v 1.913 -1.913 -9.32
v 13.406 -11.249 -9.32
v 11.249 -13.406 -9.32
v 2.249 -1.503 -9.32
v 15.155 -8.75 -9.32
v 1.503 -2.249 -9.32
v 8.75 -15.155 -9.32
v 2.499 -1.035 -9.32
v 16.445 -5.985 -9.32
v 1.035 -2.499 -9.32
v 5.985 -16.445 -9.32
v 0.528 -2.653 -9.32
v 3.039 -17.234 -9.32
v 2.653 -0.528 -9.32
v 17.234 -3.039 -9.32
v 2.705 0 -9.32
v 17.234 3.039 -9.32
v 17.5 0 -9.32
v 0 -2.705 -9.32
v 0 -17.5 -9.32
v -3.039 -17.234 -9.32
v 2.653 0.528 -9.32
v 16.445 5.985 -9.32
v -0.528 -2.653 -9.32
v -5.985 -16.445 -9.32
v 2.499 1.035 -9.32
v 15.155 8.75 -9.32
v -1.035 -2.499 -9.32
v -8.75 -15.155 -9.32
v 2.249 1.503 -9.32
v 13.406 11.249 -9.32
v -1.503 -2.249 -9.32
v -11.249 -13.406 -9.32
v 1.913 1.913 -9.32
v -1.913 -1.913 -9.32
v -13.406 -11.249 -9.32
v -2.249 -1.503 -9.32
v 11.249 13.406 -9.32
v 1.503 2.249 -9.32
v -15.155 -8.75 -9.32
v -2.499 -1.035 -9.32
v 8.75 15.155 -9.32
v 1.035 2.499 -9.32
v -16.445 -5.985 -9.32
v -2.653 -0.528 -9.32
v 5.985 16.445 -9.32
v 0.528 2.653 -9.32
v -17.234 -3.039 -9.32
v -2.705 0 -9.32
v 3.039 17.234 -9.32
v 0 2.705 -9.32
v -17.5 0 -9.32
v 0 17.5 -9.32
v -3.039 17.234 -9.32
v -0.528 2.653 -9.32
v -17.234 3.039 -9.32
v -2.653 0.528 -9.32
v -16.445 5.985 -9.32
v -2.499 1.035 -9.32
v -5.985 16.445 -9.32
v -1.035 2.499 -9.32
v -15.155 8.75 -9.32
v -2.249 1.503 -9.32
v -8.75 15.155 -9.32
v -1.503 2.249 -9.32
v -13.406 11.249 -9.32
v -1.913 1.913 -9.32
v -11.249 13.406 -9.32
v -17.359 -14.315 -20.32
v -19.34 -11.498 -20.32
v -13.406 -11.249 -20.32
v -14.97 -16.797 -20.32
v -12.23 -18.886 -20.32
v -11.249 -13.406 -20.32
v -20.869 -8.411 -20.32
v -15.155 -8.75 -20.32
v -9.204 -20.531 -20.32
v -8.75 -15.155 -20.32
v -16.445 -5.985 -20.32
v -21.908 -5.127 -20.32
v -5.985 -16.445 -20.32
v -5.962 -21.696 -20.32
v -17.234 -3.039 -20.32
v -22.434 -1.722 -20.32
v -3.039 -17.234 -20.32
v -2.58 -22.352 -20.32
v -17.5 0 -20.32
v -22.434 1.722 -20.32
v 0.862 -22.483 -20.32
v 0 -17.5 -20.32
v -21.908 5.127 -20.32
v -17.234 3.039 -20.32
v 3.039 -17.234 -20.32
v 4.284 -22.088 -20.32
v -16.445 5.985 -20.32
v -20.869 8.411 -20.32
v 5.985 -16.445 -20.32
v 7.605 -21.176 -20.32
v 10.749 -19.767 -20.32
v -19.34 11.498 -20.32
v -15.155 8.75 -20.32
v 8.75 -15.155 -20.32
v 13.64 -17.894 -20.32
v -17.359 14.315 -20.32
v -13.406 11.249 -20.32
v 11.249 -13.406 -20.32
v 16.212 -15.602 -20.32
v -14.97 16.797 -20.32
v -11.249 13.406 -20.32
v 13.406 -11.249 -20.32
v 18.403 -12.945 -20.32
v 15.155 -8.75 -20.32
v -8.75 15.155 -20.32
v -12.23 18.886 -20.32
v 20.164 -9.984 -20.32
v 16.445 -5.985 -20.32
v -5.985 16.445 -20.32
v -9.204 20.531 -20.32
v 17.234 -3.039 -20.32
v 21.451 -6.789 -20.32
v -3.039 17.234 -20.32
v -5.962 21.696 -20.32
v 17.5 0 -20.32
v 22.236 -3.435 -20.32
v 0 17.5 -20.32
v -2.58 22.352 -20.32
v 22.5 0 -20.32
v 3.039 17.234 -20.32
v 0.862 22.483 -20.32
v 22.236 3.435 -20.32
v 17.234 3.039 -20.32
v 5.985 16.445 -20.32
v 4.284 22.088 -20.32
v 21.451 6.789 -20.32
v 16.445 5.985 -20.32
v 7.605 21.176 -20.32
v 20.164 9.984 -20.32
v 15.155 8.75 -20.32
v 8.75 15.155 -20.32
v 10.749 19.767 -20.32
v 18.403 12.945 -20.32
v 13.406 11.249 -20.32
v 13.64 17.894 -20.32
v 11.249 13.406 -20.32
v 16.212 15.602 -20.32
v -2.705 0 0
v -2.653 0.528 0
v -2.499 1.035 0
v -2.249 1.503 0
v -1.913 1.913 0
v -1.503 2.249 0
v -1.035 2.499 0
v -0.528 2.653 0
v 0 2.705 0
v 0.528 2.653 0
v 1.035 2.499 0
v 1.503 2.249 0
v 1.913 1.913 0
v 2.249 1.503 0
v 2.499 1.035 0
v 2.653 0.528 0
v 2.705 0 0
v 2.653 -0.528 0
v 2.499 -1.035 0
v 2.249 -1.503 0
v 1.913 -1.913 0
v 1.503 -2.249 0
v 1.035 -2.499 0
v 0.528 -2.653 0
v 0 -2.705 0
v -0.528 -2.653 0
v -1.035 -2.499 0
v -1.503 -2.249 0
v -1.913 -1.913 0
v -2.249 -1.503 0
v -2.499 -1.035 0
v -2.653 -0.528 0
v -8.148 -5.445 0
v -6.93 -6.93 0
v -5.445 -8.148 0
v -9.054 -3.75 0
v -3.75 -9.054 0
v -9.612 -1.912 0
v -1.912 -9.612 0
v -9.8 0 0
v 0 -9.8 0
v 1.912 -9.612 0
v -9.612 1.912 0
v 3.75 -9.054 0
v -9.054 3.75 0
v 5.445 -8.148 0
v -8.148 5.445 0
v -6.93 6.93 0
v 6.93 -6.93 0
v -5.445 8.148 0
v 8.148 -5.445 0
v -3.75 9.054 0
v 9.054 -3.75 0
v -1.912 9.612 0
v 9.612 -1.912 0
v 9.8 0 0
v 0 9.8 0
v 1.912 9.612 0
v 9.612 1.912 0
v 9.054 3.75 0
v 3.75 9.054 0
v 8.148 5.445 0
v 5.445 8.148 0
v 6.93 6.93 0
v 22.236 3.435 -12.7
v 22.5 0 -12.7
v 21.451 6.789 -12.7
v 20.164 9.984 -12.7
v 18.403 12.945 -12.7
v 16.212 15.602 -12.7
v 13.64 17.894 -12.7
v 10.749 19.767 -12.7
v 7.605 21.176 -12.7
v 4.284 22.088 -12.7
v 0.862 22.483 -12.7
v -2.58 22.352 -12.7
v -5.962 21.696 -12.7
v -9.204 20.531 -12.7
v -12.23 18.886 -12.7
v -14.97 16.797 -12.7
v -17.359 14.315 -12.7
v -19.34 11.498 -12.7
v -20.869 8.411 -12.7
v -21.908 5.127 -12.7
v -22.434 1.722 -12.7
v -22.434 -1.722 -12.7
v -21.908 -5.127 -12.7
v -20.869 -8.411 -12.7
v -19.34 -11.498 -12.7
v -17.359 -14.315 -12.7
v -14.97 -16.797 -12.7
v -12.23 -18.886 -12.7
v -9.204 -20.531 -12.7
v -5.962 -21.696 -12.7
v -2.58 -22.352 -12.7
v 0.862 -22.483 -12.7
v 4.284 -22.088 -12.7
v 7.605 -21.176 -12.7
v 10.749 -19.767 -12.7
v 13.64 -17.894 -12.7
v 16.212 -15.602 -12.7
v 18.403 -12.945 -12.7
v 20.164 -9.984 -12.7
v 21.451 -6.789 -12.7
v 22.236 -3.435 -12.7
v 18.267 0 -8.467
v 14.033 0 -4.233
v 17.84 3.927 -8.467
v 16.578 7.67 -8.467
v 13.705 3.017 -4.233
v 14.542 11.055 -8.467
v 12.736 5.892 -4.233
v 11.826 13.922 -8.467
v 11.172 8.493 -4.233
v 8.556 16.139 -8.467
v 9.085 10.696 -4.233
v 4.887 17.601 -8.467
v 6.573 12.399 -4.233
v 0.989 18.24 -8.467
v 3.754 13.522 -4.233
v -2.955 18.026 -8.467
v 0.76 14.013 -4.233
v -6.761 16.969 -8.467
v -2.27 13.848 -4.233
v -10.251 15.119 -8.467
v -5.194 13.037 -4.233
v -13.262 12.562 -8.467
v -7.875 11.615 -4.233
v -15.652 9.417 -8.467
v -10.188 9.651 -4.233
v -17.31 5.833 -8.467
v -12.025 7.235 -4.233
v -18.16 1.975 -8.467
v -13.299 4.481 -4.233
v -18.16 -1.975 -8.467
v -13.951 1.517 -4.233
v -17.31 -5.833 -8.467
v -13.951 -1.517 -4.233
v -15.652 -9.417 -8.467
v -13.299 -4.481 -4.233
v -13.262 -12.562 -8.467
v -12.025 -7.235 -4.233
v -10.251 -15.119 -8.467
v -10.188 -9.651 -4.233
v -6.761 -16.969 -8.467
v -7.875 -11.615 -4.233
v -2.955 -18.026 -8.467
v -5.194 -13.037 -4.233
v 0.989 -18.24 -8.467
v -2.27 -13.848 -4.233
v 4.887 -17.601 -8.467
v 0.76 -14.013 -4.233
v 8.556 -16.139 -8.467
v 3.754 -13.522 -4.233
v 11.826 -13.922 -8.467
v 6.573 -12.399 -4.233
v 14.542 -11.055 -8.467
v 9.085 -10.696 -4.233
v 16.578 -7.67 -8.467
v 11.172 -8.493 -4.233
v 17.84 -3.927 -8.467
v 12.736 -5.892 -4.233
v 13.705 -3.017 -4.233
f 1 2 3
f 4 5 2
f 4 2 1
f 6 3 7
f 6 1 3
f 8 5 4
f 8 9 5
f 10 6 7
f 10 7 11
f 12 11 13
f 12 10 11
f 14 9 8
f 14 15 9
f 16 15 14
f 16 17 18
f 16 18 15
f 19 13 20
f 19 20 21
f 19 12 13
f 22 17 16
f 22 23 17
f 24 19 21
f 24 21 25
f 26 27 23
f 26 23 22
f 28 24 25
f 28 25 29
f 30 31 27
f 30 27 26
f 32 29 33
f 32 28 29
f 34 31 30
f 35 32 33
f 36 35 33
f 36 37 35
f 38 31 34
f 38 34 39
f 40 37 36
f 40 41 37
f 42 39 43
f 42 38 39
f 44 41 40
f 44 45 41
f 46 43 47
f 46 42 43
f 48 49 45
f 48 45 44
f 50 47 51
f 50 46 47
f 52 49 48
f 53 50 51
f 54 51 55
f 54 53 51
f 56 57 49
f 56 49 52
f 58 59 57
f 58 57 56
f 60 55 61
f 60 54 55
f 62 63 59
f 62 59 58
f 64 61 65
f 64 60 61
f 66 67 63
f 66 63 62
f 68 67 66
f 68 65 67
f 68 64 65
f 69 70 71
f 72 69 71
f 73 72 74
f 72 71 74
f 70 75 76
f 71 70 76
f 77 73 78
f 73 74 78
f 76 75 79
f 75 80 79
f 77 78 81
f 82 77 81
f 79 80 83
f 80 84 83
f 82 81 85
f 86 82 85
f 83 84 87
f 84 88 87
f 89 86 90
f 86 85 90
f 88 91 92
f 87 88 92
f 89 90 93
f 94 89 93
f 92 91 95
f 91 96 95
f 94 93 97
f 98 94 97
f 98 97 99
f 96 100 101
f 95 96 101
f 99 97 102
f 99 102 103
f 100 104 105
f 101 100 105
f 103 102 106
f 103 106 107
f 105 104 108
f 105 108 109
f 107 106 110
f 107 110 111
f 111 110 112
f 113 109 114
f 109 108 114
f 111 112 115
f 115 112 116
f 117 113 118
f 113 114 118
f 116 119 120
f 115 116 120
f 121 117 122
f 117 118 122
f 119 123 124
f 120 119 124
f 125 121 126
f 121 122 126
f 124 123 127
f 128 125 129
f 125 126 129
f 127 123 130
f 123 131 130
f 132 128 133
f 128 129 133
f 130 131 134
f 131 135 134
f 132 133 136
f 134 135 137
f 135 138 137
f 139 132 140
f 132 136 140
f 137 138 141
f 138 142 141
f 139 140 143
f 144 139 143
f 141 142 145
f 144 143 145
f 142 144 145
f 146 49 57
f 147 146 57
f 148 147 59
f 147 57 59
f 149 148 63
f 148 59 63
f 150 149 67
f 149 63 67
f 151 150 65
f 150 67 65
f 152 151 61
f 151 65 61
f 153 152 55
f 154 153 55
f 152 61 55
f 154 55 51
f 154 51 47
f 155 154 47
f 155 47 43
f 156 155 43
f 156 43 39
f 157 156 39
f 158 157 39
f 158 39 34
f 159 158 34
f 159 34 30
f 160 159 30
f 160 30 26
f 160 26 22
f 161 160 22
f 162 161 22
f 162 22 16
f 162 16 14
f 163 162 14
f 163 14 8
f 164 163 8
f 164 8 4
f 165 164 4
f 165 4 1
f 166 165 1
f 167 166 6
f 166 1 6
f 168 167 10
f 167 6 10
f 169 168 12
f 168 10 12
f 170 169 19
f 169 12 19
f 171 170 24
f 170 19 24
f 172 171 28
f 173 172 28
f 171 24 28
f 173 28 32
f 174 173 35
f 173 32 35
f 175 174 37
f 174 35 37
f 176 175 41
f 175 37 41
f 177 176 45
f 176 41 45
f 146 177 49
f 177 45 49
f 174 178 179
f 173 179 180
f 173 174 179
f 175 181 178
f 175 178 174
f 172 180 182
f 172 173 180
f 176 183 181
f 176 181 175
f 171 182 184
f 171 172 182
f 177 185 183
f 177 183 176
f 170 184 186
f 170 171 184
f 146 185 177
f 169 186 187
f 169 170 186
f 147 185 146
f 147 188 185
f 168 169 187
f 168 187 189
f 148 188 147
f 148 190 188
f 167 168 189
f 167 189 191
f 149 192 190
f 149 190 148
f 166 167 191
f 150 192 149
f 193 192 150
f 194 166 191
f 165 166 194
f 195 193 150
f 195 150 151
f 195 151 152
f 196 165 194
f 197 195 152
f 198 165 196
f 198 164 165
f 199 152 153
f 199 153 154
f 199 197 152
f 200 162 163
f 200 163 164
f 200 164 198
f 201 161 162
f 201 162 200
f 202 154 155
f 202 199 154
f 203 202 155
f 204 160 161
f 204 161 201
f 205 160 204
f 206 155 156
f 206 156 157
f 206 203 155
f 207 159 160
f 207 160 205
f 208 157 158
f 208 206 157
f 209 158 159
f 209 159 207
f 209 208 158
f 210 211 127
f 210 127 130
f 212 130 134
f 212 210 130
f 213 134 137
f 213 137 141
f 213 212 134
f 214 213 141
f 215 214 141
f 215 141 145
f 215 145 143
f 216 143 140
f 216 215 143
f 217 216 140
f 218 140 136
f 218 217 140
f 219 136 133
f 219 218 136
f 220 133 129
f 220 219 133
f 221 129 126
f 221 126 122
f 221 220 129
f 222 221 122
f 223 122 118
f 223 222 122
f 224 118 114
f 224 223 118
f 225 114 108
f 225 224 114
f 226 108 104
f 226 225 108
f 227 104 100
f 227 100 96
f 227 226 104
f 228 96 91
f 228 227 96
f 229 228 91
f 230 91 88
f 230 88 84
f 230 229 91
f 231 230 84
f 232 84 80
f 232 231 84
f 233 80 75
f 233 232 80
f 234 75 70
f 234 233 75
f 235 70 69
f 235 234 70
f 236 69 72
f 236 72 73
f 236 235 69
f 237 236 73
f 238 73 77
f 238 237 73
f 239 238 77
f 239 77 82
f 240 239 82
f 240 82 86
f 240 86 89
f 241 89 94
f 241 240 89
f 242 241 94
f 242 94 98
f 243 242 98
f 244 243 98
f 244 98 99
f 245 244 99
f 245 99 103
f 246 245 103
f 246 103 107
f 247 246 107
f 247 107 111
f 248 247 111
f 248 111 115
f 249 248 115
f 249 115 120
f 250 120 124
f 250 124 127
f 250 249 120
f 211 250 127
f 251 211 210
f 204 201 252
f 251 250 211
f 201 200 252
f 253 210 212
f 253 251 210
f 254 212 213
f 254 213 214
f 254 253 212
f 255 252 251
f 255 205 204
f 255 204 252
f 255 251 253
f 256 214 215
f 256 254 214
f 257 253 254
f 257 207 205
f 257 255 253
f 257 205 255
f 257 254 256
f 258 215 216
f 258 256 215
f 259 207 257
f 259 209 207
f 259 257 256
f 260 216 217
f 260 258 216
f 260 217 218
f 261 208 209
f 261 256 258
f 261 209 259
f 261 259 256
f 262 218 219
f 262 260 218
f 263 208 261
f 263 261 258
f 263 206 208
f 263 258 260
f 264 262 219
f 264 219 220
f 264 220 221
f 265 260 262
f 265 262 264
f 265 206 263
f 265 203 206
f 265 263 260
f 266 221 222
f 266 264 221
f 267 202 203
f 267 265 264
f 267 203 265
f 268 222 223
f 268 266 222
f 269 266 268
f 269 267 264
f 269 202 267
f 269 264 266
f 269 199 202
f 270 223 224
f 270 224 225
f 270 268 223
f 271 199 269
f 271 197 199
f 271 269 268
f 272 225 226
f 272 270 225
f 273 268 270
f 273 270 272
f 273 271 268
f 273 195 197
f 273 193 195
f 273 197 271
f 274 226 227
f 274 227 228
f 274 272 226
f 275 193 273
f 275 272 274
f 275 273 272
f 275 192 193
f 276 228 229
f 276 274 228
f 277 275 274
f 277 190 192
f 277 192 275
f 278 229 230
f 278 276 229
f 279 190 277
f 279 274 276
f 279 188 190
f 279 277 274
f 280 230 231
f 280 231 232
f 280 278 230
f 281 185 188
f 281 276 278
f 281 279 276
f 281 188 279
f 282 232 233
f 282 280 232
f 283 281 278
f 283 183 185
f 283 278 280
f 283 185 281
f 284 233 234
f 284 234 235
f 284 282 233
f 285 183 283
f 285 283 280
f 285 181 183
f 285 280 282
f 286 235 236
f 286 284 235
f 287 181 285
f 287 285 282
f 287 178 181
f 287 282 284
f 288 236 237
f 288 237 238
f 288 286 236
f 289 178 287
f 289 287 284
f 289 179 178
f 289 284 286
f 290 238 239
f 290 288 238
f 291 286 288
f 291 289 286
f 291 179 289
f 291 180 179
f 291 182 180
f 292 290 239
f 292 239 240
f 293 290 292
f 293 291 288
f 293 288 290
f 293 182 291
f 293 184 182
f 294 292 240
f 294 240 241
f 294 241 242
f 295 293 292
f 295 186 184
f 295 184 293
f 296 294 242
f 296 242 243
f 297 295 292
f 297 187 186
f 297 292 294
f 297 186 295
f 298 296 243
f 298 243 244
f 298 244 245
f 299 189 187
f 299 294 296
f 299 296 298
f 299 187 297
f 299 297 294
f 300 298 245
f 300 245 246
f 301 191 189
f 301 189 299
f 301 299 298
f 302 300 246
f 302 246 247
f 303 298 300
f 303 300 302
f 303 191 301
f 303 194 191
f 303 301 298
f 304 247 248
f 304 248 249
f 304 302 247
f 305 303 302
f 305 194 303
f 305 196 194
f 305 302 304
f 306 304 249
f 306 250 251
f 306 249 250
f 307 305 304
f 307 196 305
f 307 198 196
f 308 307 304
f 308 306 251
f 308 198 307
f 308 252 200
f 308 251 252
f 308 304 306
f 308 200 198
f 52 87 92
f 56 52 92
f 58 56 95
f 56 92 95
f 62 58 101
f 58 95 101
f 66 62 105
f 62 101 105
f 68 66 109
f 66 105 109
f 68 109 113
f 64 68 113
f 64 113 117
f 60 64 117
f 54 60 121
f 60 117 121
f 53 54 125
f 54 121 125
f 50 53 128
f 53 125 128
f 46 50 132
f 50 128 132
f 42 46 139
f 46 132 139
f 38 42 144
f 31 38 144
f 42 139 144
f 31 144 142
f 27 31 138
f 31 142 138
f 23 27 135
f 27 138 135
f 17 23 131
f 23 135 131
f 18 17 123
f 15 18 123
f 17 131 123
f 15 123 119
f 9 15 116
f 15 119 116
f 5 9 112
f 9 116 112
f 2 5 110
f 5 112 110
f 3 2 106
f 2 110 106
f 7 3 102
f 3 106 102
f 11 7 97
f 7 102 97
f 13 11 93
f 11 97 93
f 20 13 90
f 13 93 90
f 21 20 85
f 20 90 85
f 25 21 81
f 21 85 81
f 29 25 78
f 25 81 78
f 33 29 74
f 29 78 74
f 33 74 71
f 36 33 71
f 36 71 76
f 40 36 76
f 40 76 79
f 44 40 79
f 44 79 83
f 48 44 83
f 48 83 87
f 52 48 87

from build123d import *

# Parameters (mm, degrees)
SKETCH1_R                   = 22.5
BOSS_EXTRUDE1_DEPTH         = 20.32
SKETCH2_R                   = 17.5
CUT_EXTRUDE1_DEPTH          = 11
F_1_4_28_TAPPED_HOLE1_D     = 5.4102
F_1_4_28_TAPPED_HOLE1_DEPTH = 9.32
CHAMFER1_SIZE               = 12.7


with BuildPart() as part:
    # Sketch1 → Boss-Extrude1 (new body)
    with BuildSketch(Plane.XY):
        Circle(SKETCH1_R)
    extrude(amount=-BOSS_EXTRUDE1_DEPTH)

    # Sketch2 → Cut-Extrude1 (cut)
    with BuildSketch(Plane(origin=(0, 0, -20.32), x_dir=(-1, 0, 0), z_dir=(0, 0, -1))):
        Circle(SKETCH2_R)
    extrude(amount=-CUT_EXTRUDE1_DEPTH, mode=Mode.SUBTRACT)

    # 1/4-28 Tapped Hole1
    with Locations(Plane.XY):
        with Locations((0, 0)):
            Hole(F_1_4_28_TAPPED_HOLE1_D / 2, depth=F_1_4_28_TAPPED_HOLE1_DEPTH)

    # Chamfer1
    chamfer1_edges = [part.edges().sort_by_distance(p)[0] for p in [
        (-22.5, 0, 0),
    ]]
    chamfer(chamfer1_edges, length=CHAMFER1_SIZE)


solid = part.part
